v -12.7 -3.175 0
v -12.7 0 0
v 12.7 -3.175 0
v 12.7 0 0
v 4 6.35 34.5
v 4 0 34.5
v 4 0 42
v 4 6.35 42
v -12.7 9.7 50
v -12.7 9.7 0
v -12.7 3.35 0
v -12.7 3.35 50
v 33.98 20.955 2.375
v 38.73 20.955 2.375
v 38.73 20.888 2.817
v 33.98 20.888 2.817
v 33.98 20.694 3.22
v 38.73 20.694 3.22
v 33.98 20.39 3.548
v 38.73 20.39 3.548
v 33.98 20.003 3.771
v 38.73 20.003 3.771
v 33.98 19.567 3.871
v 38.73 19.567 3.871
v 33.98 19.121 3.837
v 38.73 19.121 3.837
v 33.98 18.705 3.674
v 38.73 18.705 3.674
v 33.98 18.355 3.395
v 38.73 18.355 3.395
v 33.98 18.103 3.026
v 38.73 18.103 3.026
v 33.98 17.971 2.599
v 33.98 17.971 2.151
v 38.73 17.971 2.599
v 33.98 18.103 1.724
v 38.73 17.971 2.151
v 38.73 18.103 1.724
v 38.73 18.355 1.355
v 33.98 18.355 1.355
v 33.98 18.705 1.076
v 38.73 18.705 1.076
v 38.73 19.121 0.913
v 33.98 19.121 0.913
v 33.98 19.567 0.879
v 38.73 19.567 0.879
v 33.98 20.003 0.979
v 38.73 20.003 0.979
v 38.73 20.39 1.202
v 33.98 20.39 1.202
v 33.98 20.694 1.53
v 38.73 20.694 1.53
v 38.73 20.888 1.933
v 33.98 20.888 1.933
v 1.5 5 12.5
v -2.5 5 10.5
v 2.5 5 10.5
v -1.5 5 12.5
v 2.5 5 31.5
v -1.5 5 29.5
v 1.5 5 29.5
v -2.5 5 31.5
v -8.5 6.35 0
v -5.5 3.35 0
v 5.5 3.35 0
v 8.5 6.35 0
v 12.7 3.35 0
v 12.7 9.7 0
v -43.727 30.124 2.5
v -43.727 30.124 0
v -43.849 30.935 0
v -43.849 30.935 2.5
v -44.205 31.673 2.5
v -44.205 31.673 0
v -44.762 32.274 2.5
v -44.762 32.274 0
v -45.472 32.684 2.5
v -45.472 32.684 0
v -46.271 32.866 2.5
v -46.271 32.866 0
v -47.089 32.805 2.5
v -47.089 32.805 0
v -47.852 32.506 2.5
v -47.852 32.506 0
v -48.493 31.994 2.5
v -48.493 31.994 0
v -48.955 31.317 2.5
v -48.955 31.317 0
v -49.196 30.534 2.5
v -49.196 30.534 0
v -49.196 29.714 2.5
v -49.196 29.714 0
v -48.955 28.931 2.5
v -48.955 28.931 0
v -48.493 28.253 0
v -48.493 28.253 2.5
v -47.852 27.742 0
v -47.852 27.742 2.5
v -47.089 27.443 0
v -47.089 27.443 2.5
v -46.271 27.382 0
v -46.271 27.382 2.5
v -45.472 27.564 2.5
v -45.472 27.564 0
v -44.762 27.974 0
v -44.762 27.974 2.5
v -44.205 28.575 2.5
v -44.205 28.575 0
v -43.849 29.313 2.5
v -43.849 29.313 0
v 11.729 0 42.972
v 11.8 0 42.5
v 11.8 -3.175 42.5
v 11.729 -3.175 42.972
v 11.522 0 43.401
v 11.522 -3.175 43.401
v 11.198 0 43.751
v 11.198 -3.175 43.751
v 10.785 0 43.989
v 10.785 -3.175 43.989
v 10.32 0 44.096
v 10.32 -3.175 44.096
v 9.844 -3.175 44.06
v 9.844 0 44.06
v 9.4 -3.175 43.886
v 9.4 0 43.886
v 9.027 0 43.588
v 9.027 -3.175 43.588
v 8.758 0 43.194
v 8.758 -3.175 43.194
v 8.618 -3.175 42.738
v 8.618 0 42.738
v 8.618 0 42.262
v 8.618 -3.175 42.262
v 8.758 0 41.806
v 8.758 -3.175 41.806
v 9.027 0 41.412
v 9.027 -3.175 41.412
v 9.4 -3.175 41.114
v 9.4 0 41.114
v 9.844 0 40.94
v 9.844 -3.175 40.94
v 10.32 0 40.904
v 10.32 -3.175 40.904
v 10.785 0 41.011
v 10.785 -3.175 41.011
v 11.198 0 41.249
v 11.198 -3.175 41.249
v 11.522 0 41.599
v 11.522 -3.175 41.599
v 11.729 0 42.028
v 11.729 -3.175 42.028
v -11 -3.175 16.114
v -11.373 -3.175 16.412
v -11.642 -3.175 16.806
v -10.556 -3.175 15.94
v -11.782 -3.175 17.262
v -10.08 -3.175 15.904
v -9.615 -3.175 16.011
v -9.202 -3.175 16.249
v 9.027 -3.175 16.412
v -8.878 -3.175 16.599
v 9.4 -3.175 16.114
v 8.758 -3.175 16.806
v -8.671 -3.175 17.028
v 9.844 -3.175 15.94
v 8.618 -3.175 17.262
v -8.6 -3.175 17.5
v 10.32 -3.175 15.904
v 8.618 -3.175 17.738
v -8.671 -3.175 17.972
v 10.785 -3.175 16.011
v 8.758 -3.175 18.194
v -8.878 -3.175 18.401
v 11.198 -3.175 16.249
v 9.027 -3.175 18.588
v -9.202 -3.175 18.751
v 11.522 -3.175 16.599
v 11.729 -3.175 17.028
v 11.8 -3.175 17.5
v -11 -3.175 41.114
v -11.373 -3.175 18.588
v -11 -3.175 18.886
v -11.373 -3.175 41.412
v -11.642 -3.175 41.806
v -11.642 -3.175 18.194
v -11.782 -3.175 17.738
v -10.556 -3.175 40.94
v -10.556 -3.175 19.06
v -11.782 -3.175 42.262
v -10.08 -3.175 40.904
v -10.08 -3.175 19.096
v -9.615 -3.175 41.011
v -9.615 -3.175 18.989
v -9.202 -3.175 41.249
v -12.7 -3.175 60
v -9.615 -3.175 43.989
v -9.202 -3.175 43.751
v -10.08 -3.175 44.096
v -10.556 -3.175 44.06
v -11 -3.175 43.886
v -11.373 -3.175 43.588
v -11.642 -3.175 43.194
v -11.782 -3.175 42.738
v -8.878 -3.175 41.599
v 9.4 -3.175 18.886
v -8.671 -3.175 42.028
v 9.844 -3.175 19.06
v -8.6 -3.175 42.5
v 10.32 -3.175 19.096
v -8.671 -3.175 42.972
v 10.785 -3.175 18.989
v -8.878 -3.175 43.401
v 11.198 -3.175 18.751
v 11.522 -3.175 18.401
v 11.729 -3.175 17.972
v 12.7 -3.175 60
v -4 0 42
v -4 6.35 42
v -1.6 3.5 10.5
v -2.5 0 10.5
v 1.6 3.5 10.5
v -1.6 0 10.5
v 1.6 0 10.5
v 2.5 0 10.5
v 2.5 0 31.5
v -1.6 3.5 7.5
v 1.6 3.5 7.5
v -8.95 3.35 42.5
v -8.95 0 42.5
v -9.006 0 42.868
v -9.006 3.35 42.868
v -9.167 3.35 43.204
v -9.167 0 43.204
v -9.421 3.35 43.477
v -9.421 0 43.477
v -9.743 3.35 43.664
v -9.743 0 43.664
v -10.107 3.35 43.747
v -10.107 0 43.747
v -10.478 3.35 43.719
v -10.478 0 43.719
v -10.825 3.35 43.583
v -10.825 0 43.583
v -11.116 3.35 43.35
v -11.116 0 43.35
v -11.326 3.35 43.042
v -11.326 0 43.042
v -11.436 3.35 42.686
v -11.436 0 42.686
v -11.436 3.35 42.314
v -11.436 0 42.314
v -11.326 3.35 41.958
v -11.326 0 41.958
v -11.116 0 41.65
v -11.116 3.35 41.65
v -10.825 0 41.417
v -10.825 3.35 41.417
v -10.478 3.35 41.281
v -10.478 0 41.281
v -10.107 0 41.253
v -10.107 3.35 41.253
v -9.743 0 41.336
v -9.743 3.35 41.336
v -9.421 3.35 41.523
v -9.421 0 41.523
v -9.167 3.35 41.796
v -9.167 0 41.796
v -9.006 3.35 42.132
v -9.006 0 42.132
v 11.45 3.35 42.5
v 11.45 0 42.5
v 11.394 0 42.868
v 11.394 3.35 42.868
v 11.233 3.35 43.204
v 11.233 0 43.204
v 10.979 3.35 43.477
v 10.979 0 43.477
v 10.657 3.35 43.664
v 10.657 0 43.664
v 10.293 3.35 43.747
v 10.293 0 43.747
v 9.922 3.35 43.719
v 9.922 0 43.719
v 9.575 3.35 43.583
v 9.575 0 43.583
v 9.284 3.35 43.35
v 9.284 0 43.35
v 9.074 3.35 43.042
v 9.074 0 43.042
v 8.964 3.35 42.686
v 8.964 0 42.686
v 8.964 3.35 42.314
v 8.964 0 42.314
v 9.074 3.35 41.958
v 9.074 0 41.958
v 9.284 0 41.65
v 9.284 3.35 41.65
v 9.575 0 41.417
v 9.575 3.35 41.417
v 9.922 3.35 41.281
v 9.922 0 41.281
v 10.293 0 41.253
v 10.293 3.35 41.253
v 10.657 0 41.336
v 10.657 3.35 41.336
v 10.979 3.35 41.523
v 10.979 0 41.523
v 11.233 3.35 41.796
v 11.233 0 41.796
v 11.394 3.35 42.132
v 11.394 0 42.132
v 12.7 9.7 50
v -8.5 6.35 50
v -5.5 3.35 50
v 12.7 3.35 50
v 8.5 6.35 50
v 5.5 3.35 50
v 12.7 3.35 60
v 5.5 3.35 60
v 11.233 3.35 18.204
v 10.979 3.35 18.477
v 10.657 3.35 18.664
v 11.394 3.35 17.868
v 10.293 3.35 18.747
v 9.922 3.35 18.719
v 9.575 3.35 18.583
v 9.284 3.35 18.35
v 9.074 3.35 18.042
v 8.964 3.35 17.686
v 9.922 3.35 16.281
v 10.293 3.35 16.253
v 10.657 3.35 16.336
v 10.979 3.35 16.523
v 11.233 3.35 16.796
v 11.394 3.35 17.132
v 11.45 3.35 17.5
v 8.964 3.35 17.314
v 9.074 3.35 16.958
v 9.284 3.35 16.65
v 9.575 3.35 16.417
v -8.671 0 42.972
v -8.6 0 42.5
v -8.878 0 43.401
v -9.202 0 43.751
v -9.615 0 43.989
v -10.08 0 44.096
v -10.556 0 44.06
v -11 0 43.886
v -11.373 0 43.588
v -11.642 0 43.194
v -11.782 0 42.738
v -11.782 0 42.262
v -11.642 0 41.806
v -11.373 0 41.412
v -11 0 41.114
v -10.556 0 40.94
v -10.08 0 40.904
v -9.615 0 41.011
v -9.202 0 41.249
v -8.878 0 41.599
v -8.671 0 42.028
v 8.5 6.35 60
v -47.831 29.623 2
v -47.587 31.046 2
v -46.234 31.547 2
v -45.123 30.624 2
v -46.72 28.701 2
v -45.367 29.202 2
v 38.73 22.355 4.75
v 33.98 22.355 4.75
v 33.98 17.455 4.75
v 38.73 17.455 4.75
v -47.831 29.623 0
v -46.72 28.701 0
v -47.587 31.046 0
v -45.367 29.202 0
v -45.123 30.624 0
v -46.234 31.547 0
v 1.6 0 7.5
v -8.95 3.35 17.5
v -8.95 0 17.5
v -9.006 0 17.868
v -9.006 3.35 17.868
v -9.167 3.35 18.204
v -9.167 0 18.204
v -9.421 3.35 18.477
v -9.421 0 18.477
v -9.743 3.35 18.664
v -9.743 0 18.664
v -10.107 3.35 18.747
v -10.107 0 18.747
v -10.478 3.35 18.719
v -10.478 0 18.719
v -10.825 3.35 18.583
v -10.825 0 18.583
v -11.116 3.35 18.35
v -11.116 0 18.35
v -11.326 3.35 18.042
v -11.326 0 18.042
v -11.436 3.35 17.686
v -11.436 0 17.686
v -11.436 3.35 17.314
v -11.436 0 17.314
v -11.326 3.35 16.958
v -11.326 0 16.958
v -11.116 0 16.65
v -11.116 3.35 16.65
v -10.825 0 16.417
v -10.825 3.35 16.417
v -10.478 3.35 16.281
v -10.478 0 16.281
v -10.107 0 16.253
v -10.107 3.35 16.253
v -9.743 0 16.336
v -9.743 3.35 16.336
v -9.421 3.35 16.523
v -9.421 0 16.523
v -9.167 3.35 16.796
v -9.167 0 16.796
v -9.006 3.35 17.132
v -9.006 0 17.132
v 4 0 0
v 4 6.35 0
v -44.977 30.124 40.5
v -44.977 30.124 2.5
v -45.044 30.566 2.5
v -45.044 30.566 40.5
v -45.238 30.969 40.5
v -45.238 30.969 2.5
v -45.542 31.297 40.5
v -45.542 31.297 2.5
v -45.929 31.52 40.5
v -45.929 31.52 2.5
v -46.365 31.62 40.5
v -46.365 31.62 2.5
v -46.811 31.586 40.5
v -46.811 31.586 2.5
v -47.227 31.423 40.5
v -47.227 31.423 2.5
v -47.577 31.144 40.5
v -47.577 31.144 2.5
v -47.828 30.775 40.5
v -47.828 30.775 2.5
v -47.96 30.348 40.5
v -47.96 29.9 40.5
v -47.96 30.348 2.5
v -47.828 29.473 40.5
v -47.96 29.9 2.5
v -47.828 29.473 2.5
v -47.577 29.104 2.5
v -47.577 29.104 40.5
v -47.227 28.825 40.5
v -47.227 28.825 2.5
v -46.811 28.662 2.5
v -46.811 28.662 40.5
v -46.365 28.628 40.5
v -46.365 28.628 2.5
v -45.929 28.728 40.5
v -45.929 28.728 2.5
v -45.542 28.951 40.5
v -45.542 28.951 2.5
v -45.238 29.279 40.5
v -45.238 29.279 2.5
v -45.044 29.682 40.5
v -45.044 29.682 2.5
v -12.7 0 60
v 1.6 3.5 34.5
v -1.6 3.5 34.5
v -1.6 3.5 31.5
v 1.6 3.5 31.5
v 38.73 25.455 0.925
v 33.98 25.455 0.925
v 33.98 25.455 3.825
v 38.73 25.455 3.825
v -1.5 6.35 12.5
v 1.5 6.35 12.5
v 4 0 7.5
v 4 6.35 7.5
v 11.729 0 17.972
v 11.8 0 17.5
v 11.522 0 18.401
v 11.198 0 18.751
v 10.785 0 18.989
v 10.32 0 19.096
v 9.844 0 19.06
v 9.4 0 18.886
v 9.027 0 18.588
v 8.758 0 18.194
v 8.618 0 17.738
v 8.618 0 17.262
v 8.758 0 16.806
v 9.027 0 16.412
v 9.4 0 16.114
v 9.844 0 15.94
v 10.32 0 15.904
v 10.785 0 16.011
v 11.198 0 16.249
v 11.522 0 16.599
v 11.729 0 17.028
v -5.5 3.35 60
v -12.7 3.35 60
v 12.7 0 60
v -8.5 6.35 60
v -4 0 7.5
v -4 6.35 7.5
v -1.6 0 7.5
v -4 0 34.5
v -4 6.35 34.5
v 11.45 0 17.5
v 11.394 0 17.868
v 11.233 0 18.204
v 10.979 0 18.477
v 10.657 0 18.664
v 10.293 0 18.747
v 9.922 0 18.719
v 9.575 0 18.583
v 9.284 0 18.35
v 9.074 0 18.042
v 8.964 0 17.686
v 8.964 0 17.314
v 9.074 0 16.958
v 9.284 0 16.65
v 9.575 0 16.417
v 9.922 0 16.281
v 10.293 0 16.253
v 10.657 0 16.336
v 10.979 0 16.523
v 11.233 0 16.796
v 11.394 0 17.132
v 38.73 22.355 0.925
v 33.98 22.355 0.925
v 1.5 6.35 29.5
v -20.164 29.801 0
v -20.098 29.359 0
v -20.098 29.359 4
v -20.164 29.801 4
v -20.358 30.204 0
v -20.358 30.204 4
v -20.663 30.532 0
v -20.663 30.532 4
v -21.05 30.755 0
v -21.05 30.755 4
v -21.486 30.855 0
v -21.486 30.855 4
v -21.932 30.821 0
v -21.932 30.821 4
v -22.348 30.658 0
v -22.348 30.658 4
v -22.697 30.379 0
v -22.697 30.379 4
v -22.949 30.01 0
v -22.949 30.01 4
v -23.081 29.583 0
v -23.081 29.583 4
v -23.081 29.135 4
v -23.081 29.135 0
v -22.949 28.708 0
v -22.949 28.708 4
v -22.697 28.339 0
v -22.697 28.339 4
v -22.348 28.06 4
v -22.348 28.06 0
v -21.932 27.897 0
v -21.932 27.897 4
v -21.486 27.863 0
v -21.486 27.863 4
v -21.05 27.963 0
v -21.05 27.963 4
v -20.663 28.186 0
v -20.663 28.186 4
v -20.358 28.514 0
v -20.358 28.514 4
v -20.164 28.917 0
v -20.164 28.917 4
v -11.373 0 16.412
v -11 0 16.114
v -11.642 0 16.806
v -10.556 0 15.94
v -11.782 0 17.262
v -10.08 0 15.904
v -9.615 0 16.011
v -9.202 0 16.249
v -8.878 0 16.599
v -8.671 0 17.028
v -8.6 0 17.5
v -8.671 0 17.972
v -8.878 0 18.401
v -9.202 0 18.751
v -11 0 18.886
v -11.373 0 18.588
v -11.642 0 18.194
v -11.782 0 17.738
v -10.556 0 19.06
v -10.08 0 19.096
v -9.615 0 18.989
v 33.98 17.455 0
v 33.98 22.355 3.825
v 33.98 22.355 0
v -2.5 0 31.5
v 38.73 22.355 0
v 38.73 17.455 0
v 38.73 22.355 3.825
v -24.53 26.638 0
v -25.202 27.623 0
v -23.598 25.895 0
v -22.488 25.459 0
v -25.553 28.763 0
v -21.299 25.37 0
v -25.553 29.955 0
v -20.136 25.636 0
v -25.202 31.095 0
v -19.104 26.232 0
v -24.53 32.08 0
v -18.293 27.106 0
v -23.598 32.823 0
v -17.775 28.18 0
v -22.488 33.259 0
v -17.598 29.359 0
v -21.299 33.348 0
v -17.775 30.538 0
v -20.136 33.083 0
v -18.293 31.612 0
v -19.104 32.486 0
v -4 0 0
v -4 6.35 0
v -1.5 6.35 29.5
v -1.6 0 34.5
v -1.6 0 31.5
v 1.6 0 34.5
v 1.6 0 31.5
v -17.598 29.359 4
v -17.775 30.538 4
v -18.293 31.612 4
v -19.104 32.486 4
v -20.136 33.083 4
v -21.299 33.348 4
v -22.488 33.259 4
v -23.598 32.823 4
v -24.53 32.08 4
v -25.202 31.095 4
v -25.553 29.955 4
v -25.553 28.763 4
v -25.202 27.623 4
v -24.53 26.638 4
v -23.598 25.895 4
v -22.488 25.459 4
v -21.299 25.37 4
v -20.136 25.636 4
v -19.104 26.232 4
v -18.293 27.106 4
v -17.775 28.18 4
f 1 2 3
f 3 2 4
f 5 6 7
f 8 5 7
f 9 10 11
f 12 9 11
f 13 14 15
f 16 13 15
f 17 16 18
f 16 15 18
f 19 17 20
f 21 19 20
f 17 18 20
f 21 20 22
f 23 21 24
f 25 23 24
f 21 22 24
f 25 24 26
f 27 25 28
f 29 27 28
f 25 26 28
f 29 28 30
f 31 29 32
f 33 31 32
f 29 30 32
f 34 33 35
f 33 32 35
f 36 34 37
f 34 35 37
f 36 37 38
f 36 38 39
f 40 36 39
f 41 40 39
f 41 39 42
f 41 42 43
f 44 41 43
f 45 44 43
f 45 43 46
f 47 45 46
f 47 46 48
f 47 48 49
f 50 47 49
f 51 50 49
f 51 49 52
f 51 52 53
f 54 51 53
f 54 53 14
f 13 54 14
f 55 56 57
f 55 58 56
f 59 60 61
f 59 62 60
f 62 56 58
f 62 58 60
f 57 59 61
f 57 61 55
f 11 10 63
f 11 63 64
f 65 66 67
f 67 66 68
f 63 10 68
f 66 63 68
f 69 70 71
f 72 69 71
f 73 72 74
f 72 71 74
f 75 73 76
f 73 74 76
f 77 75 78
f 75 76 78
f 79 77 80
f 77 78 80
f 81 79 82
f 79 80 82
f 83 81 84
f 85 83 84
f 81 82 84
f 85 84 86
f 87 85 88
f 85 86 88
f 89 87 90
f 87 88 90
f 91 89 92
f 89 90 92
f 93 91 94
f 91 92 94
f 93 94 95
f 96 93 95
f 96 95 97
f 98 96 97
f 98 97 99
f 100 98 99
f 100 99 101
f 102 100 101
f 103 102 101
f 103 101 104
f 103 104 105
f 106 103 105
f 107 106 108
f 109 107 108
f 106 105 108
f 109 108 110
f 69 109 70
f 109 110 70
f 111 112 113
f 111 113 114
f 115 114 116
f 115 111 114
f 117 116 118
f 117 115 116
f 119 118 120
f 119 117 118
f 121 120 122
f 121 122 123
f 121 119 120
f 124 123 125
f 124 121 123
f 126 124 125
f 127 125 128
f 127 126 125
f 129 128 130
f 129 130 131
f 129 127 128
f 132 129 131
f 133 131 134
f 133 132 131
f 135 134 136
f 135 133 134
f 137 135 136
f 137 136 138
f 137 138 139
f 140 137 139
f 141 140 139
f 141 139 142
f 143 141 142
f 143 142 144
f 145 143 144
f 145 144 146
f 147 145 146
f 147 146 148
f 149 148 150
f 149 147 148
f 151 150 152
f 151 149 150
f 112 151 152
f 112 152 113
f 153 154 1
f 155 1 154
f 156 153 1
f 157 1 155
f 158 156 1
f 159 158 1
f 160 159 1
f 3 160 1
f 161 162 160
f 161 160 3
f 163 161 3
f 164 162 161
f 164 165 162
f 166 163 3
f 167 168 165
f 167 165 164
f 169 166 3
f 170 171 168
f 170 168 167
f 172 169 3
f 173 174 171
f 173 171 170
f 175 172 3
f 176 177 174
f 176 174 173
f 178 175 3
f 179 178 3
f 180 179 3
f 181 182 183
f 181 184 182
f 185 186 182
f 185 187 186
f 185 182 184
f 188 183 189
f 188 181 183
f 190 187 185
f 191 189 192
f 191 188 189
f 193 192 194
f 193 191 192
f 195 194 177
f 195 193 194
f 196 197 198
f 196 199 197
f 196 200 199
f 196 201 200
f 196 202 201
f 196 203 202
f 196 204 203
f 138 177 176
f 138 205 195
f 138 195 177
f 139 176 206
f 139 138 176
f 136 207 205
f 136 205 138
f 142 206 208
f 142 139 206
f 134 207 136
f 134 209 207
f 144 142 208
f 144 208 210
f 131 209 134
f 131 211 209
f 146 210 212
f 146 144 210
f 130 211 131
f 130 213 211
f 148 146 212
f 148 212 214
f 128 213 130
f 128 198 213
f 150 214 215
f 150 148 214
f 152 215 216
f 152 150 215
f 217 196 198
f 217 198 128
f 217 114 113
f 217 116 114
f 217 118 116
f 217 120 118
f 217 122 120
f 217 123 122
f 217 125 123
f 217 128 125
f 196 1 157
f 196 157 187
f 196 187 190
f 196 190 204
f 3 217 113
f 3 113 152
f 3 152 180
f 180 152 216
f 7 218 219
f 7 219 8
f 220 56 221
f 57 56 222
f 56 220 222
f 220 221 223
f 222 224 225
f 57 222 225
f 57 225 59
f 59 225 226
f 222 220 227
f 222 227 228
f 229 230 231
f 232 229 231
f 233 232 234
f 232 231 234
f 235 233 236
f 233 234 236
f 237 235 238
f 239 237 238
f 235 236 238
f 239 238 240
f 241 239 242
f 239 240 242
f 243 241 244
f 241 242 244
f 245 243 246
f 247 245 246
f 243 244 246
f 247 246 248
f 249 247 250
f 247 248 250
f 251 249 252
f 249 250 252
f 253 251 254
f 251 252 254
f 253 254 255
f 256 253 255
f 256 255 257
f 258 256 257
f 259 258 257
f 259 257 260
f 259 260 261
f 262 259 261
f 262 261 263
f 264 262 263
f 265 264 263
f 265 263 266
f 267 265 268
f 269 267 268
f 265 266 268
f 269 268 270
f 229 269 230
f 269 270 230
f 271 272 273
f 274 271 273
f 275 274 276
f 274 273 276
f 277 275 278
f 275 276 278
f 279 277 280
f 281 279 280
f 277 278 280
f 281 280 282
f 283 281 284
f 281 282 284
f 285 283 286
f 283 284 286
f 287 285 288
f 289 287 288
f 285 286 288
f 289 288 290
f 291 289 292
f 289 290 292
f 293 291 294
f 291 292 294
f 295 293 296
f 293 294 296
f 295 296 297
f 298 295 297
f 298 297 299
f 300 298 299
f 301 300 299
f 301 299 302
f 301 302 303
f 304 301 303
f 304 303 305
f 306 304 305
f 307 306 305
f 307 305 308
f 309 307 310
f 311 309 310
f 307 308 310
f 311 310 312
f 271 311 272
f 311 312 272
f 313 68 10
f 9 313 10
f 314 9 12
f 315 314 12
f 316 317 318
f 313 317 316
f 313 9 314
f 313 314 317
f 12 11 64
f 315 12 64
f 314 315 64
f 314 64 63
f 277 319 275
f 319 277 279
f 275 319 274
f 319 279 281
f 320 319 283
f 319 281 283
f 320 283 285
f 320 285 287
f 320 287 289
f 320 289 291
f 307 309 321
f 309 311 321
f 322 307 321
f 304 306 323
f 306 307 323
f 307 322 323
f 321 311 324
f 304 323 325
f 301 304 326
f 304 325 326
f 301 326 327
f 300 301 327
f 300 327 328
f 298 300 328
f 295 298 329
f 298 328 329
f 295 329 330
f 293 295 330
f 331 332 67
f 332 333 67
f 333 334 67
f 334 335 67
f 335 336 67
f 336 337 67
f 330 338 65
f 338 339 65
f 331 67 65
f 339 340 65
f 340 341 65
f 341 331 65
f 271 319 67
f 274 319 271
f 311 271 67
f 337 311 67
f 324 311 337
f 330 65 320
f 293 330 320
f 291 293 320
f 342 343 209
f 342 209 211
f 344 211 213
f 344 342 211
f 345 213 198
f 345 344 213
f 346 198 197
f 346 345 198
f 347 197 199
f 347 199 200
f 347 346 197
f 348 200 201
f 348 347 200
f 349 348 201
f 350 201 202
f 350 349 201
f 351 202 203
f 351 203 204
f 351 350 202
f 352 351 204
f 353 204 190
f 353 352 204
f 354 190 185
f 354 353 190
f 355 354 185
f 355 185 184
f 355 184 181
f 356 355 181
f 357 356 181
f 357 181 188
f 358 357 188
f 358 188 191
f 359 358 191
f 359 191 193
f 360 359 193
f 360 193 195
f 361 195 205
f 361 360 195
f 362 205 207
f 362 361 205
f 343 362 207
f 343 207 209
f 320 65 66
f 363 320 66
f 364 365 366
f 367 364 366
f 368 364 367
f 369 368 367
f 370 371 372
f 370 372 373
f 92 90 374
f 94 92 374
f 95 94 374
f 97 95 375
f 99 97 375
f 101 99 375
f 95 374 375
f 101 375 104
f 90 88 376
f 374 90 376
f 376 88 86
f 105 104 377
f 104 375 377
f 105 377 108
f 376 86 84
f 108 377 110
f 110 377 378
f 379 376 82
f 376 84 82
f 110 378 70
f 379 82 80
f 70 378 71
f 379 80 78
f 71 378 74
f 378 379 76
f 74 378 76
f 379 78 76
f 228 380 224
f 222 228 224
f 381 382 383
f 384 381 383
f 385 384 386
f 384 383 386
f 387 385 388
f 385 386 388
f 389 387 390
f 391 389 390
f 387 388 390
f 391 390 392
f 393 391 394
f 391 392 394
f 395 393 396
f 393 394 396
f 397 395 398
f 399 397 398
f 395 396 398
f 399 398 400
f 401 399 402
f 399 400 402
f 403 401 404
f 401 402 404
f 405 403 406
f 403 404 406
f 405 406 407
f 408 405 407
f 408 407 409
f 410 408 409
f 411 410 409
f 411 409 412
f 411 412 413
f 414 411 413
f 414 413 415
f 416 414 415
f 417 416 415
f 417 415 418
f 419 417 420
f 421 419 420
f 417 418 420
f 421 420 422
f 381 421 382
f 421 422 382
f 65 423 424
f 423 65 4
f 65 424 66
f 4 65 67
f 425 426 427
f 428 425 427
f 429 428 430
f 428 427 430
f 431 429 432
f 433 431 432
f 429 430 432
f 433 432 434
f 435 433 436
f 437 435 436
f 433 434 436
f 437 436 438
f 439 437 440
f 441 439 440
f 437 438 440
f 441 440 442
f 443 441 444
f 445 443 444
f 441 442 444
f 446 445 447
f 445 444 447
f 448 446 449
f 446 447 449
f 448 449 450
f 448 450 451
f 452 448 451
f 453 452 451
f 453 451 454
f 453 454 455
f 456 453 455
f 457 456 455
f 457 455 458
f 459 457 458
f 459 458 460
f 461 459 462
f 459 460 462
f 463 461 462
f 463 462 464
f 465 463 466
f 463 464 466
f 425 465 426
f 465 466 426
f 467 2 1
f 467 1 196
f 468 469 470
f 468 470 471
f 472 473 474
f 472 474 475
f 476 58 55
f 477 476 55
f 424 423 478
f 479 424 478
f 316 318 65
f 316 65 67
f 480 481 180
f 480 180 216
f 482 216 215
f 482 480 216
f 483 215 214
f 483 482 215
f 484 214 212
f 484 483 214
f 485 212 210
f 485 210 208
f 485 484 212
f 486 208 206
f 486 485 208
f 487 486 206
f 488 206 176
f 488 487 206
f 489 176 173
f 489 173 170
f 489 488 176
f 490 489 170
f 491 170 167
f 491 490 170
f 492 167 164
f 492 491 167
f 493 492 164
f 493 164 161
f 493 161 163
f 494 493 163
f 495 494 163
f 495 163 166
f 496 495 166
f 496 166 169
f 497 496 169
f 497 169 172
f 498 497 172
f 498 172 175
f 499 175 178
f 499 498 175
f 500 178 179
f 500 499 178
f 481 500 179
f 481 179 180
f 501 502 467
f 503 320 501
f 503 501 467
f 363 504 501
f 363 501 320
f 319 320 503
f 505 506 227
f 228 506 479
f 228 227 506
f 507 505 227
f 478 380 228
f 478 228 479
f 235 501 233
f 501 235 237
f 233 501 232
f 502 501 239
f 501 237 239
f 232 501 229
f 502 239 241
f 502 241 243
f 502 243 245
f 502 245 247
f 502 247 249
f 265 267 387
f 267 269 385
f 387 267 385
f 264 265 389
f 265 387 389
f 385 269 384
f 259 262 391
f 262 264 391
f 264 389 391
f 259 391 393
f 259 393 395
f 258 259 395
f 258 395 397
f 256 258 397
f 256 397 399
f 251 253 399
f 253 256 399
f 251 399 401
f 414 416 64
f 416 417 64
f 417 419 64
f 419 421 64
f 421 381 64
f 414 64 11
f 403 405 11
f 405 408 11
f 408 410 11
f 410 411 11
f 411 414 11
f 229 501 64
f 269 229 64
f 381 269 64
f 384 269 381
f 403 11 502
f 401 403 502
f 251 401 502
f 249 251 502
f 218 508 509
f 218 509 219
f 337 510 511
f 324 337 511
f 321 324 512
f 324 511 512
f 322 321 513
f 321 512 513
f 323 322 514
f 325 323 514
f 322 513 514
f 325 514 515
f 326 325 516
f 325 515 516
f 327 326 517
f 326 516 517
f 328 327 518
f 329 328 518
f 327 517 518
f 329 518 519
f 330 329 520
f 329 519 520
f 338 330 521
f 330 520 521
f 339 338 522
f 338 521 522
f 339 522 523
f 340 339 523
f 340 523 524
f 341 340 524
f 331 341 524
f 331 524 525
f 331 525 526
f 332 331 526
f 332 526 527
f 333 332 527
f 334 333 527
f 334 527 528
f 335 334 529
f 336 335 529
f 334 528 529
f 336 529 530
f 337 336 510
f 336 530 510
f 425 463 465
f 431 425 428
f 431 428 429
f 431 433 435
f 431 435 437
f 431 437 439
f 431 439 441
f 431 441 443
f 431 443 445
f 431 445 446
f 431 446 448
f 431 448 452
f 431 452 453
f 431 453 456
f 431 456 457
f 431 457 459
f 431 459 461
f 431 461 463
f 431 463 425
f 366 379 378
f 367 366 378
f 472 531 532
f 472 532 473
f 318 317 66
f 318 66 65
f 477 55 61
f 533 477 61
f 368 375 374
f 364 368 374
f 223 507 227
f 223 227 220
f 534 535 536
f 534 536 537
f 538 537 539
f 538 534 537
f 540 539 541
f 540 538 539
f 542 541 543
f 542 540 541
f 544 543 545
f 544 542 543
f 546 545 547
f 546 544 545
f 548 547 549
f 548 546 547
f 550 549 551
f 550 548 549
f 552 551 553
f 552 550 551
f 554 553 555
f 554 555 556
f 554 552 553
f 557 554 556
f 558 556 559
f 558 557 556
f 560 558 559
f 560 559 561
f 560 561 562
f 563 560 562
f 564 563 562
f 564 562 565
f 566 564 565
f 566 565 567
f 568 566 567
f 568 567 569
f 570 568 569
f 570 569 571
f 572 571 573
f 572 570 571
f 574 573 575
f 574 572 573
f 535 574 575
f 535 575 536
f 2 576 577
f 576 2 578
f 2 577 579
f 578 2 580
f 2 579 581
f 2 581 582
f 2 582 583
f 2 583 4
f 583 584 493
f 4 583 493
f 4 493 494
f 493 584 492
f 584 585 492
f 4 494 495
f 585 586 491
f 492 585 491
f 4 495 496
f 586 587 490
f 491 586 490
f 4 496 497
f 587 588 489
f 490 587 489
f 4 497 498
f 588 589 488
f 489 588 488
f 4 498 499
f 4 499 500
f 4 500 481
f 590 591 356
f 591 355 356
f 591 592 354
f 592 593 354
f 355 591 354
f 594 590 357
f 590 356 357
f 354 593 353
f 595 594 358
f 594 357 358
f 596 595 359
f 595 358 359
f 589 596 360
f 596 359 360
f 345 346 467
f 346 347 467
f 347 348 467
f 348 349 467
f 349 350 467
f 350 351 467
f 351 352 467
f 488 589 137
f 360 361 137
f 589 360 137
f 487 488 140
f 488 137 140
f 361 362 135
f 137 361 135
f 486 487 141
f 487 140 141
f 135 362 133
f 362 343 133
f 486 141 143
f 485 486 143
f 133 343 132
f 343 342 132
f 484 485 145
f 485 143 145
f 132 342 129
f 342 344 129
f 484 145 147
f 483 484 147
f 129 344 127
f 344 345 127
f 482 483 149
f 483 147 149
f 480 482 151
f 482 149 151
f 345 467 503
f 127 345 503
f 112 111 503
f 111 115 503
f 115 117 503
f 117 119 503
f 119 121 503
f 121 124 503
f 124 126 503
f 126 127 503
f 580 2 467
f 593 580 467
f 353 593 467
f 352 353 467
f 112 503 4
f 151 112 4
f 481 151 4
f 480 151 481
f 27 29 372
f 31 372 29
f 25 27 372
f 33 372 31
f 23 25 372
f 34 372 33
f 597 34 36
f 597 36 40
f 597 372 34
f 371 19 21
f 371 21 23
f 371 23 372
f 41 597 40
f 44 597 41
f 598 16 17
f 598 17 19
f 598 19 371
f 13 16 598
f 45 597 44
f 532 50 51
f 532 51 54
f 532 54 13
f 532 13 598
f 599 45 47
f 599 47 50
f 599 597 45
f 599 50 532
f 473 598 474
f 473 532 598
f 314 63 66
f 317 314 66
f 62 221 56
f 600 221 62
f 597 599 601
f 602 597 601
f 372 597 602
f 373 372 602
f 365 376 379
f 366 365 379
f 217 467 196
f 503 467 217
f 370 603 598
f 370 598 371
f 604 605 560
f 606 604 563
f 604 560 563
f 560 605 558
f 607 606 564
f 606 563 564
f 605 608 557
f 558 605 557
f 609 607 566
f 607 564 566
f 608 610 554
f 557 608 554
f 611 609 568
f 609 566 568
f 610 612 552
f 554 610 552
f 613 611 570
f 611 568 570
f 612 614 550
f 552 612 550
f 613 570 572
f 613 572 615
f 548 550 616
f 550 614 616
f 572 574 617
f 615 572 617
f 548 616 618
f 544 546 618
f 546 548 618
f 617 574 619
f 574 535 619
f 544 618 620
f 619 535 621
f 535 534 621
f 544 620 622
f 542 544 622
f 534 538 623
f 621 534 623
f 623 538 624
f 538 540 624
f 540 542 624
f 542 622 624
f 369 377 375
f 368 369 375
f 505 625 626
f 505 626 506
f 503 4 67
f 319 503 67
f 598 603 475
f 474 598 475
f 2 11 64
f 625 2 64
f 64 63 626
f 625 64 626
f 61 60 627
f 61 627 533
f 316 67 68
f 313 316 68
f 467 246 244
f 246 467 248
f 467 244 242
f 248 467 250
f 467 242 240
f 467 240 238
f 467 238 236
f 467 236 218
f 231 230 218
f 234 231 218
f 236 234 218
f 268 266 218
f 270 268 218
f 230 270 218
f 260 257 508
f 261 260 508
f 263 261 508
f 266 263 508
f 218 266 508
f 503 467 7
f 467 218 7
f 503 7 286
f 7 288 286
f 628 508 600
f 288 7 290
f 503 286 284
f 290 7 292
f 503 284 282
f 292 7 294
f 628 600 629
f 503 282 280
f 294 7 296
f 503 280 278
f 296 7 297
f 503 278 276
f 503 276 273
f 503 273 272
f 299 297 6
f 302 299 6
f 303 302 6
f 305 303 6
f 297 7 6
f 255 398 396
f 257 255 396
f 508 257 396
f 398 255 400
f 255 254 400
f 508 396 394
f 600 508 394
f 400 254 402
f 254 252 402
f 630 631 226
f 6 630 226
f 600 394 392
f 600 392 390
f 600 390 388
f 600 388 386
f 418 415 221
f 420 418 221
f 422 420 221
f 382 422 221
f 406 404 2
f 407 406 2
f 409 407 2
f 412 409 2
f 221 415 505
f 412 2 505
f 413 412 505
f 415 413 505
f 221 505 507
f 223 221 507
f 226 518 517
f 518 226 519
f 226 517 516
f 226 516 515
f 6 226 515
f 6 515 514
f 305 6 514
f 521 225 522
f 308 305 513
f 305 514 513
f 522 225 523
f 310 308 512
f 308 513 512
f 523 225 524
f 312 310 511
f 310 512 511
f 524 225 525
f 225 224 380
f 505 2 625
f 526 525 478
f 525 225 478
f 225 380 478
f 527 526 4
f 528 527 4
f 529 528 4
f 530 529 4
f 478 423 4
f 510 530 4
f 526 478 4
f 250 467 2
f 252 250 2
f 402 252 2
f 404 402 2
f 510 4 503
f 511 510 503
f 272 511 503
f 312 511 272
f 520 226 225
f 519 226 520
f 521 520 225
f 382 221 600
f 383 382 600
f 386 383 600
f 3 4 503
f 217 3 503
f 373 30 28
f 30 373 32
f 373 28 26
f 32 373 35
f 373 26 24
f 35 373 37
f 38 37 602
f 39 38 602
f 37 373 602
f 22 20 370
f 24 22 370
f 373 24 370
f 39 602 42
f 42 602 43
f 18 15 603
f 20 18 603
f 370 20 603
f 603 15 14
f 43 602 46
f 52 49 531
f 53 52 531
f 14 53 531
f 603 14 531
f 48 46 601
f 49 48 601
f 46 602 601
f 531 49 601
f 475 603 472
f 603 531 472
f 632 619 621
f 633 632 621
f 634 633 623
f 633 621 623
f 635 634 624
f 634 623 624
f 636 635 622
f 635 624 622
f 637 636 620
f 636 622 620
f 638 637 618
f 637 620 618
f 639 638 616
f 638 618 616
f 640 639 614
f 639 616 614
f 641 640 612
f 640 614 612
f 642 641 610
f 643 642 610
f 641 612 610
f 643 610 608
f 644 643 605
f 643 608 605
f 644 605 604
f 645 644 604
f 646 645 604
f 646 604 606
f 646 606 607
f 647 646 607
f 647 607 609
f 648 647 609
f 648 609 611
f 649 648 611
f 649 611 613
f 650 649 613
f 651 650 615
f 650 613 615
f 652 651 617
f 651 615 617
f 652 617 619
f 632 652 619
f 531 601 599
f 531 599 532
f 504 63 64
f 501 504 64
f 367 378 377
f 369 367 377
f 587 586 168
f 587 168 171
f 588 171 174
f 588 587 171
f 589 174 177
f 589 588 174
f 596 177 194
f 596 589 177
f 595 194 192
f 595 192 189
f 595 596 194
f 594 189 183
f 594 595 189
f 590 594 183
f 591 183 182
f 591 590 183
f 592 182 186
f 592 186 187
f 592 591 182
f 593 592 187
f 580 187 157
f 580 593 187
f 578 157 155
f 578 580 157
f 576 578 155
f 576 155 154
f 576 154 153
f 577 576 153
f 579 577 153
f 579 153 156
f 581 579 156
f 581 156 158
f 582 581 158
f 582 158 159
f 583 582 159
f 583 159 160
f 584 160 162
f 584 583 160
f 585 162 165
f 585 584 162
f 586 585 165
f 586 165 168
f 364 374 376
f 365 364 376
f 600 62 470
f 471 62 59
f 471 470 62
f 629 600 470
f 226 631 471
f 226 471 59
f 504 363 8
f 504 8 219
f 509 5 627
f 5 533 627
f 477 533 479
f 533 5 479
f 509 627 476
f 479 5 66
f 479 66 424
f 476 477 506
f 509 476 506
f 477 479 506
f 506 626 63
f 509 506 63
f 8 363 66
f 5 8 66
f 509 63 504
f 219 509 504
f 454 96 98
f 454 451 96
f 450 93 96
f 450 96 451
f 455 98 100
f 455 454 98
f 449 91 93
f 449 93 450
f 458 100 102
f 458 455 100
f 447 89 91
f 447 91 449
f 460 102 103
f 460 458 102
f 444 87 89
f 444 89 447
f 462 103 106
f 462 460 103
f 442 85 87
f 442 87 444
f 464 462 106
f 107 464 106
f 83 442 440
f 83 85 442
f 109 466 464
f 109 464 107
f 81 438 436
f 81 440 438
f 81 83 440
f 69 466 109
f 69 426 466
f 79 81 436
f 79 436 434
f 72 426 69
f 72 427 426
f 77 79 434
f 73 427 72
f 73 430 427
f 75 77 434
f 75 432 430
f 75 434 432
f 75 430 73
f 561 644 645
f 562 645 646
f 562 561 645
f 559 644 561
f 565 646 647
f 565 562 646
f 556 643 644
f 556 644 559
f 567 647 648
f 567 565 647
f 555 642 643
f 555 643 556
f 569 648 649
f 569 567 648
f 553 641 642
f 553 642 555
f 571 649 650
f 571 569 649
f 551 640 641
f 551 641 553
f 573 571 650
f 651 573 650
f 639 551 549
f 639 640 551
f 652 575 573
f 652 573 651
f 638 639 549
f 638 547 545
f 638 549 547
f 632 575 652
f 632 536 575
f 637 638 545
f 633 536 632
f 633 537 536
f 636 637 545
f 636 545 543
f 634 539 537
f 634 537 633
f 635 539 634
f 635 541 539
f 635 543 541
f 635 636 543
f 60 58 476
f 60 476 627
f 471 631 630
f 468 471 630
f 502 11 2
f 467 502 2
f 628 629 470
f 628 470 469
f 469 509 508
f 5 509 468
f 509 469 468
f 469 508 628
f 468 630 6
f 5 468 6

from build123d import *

# Parameters (mm, degrees)
F1_DEPTH  = 60
F2_W      = 3.2
F2_H      = 42
F3_DEPTH  = 3.5
F4_W      = 8
F4_H      = 7.5
F5_DEPTH  = 6.351
F6_W      = 5
F6_H      = 21
F7_DEPTH  = 5
F8_R      = 2.75
F9_DEPTH  = 2.5
F10_R     = 1.5
F11_DEPTH = 38
F13_R     = 4
F13_R_2   = 1.5
F14_DEPTH = 4
F15_DEPTH = 2
F16_W     = 3
F16_H     = 17
F17_DEPTH = 28.3600109795
F18_R     = 1.25
F19_DEPTH = 3.35
F20_W     = 25.4
F20_H     = 60
F20_R     = 1.6
F21_DEPTH = 3.175
F23_DEPTH = 50
F24_W     = 4.75
F24_H     = 8
F25_DEPTH = 4.75
F26_R     = 1.5
F27_DEPTH = 87.9577198902
F28_W     = 3.1
F28_H     = 0.925
F29_DEPTH = 87.9577198902


# Not quite as in the source:
# - a length typed as a fraction of an inch, garbled in the dataset ("3 / 203.2 mm" for 3/8 in), is restored


with BuildPart() as f1:
    # F0 (on Top) → F1 (new body)
    with BuildSketch(Plane.XY):
        Polygon((-12.7, 3.35), (-12.7, 0), (12.7, 0), (12.7, 3.35), (5.5, 3.35), (8.5, 6.35), (-8.5, 6.35), (-5.5, 3.35), align=None)
    extrude(amount=F1_DEPTH)

    # F2 (on face) → F3 (cut)
    with BuildSketch(Plane.XZ):
        with Locations((0, 21)):
            Rectangle(F2_W, F2_H)
    extrude(amount=-F3_DEPTH, mode=Mode.SUBTRACT)

    # F4 (on face) → F5 (cut, through all)
    with BuildSketch(Plane.XZ):
        with Locations((0, 38.25)):
            Rectangle(F4_W, F4_H)
        with Locations((0, 3.75)):
            Rectangle(F4_W, F4_H)
    extrude(amount=-F5_DEPTH, mode=Mode.SUBTRACT)

    # F6 (on face) → F7 (cut)
    with BuildSketch(Plane.XZ):
        with Locations((0, 21)):
            Rectangle(F6_W, F6_H)
    extrude(amount=-F7_DEPTH, mode=Mode.SUBTRACT)

    # F16 (on face) → F17 (cut, through all)
    with BuildSketch(Plane.XZ.offset(-5)):
        with Locations((0, 21)):
            Rectangle(F16_W, F16_H)
    extrude(amount=-F17_DEPTH, mode=Mode.SUBTRACT)

    # F18 (on face) → F19 (cut, through all)
    with BuildSketch(Plane.XZ):
        with Locations((10.2, 17.5)):
            Circle(F18_R)
        with Locations((-10.2, 17.5)):
            Circle(F18_R)
        with Locations((10.2, 42.5)):
            Circle(F18_R)
        with Locations((-10.2, 42.5)):
            Circle(F18_R)
    extrude(amount=-F19_DEPTH, mode=Mode.SUBTRACT)


with BuildPart() as f9:
    # F8 (on Top) → F9 (new body)
    with BuildSketch(Plane.XY):
        with Locations((-46.4769527316, 30.1239509135)):
            Circle(F8_R)
    extrude(amount=F9_DEPTH)

    # F10 (on face) → F11 (join)
    with BuildSketch(Plane.XY.offset(2.5)):
        with Locations((-46.4769527316, 30.1239509135)):
            Circle(F10_R)
    extrude(amount=F11_DEPTH)

    # F12 (on face) → F15 (cut)
    with BuildSketch(Plane(origin=(0, 0, 0), x_dir=(1, 0, 0), z_dir=(0, 0, -1))):
        Polygon((-46.7203685833, -28.7012485355), (-47.8307570588, -29.6234040357), (-47.5873412072, -31.0461064138), (-46.23353688, -31.5466532916), (-45.1231484044, -30.6244977914), (-45.366564256, -29.2017954133), align=None)
    extrude(amount=-F15_DEPTH, mode=Mode.SUBTRACT)


with BuildPart() as f14:
    # F13 (on Top) → F14 (new body)
    with BuildSketch(Plane.XY):
        with Locations((-21.5977616608, 29.3590109795)):
            Circle(F13_R)
        with Locations((-21.5977616608, 29.3590109795)):
            Circle(F13_R_2, mode=Mode.SUBTRACT)
    extrude(amount=F14_DEPTH)


with BuildPart() as f21:
    # F20 (on face) → F21 (new body)
    with BuildSketch(Plane.XZ):
        with Locations((0, 30)):
            Rectangle(F20_W, F20_H)
        with Locations((-10.2, 17.5)):
            Circle(F20_R, mode=Mode.SUBTRACT)
        with Locations((10.2, 17.5)):
            Circle(F20_R, mode=Mode.SUBTRACT)
        with Locations((-10.2, 42.5)):
            Circle(F20_R, mode=Mode.SUBTRACT)
        with Locations((10.2, 42.5)):
            Circle(F20_R, mode=Mode.SUBTRACT)
    extrude(amount=F21_DEPTH)


with BuildPart() as f23:
    # F22 (on Top) → F23 (new body)
    with BuildSketch(Plane.XY):
        Polygon((12.7, 9.7), (-12.7, 9.7), (-12.7, 3.35), (-5.5, 3.35), (-8.5, 6.35), (8.5, 6.35), (5.5, 3.35), (12.7, 3.35), align=None)
    extrude(amount=F23_DEPTH)


with BuildPart() as f25:
    # F24 (on Top) → F25 (new body)
    with BuildSketch(Plane.XY):
        with Locations((36.3547671586, 21.4546729288)):
            Rectangle(F24_W, F24_H)
    extrude(amount=F25_DEPTH)

    # F26 (on face) → F27 (cut, through all)
    with BuildSketch(Plane.YZ.offset(38.7297671586)):
        with Locations((19.4546729288, 2.375)):
            Circle(F26_R)
    extrude(amount=-F27_DEPTH, mode=Mode.SUBTRACT)

    # F28 (on face) → F29 (cut, through all)
    with BuildSketch(Plane.YZ.offset(38.7297671586)):
        with Locations((23.9046729288, 4.2875)):
            Rectangle(F28_W, F28_H)
        with Locations((23.9046729288, 0.4625)):
            Rectangle(F28_W, F28_H)
    extrude(amount=-F29_DEPTH, mode=Mode.SUBTRACT)


solid = Compound([f1.part, f9.part, f14.part, f21.part, f23.part, f25.part])
